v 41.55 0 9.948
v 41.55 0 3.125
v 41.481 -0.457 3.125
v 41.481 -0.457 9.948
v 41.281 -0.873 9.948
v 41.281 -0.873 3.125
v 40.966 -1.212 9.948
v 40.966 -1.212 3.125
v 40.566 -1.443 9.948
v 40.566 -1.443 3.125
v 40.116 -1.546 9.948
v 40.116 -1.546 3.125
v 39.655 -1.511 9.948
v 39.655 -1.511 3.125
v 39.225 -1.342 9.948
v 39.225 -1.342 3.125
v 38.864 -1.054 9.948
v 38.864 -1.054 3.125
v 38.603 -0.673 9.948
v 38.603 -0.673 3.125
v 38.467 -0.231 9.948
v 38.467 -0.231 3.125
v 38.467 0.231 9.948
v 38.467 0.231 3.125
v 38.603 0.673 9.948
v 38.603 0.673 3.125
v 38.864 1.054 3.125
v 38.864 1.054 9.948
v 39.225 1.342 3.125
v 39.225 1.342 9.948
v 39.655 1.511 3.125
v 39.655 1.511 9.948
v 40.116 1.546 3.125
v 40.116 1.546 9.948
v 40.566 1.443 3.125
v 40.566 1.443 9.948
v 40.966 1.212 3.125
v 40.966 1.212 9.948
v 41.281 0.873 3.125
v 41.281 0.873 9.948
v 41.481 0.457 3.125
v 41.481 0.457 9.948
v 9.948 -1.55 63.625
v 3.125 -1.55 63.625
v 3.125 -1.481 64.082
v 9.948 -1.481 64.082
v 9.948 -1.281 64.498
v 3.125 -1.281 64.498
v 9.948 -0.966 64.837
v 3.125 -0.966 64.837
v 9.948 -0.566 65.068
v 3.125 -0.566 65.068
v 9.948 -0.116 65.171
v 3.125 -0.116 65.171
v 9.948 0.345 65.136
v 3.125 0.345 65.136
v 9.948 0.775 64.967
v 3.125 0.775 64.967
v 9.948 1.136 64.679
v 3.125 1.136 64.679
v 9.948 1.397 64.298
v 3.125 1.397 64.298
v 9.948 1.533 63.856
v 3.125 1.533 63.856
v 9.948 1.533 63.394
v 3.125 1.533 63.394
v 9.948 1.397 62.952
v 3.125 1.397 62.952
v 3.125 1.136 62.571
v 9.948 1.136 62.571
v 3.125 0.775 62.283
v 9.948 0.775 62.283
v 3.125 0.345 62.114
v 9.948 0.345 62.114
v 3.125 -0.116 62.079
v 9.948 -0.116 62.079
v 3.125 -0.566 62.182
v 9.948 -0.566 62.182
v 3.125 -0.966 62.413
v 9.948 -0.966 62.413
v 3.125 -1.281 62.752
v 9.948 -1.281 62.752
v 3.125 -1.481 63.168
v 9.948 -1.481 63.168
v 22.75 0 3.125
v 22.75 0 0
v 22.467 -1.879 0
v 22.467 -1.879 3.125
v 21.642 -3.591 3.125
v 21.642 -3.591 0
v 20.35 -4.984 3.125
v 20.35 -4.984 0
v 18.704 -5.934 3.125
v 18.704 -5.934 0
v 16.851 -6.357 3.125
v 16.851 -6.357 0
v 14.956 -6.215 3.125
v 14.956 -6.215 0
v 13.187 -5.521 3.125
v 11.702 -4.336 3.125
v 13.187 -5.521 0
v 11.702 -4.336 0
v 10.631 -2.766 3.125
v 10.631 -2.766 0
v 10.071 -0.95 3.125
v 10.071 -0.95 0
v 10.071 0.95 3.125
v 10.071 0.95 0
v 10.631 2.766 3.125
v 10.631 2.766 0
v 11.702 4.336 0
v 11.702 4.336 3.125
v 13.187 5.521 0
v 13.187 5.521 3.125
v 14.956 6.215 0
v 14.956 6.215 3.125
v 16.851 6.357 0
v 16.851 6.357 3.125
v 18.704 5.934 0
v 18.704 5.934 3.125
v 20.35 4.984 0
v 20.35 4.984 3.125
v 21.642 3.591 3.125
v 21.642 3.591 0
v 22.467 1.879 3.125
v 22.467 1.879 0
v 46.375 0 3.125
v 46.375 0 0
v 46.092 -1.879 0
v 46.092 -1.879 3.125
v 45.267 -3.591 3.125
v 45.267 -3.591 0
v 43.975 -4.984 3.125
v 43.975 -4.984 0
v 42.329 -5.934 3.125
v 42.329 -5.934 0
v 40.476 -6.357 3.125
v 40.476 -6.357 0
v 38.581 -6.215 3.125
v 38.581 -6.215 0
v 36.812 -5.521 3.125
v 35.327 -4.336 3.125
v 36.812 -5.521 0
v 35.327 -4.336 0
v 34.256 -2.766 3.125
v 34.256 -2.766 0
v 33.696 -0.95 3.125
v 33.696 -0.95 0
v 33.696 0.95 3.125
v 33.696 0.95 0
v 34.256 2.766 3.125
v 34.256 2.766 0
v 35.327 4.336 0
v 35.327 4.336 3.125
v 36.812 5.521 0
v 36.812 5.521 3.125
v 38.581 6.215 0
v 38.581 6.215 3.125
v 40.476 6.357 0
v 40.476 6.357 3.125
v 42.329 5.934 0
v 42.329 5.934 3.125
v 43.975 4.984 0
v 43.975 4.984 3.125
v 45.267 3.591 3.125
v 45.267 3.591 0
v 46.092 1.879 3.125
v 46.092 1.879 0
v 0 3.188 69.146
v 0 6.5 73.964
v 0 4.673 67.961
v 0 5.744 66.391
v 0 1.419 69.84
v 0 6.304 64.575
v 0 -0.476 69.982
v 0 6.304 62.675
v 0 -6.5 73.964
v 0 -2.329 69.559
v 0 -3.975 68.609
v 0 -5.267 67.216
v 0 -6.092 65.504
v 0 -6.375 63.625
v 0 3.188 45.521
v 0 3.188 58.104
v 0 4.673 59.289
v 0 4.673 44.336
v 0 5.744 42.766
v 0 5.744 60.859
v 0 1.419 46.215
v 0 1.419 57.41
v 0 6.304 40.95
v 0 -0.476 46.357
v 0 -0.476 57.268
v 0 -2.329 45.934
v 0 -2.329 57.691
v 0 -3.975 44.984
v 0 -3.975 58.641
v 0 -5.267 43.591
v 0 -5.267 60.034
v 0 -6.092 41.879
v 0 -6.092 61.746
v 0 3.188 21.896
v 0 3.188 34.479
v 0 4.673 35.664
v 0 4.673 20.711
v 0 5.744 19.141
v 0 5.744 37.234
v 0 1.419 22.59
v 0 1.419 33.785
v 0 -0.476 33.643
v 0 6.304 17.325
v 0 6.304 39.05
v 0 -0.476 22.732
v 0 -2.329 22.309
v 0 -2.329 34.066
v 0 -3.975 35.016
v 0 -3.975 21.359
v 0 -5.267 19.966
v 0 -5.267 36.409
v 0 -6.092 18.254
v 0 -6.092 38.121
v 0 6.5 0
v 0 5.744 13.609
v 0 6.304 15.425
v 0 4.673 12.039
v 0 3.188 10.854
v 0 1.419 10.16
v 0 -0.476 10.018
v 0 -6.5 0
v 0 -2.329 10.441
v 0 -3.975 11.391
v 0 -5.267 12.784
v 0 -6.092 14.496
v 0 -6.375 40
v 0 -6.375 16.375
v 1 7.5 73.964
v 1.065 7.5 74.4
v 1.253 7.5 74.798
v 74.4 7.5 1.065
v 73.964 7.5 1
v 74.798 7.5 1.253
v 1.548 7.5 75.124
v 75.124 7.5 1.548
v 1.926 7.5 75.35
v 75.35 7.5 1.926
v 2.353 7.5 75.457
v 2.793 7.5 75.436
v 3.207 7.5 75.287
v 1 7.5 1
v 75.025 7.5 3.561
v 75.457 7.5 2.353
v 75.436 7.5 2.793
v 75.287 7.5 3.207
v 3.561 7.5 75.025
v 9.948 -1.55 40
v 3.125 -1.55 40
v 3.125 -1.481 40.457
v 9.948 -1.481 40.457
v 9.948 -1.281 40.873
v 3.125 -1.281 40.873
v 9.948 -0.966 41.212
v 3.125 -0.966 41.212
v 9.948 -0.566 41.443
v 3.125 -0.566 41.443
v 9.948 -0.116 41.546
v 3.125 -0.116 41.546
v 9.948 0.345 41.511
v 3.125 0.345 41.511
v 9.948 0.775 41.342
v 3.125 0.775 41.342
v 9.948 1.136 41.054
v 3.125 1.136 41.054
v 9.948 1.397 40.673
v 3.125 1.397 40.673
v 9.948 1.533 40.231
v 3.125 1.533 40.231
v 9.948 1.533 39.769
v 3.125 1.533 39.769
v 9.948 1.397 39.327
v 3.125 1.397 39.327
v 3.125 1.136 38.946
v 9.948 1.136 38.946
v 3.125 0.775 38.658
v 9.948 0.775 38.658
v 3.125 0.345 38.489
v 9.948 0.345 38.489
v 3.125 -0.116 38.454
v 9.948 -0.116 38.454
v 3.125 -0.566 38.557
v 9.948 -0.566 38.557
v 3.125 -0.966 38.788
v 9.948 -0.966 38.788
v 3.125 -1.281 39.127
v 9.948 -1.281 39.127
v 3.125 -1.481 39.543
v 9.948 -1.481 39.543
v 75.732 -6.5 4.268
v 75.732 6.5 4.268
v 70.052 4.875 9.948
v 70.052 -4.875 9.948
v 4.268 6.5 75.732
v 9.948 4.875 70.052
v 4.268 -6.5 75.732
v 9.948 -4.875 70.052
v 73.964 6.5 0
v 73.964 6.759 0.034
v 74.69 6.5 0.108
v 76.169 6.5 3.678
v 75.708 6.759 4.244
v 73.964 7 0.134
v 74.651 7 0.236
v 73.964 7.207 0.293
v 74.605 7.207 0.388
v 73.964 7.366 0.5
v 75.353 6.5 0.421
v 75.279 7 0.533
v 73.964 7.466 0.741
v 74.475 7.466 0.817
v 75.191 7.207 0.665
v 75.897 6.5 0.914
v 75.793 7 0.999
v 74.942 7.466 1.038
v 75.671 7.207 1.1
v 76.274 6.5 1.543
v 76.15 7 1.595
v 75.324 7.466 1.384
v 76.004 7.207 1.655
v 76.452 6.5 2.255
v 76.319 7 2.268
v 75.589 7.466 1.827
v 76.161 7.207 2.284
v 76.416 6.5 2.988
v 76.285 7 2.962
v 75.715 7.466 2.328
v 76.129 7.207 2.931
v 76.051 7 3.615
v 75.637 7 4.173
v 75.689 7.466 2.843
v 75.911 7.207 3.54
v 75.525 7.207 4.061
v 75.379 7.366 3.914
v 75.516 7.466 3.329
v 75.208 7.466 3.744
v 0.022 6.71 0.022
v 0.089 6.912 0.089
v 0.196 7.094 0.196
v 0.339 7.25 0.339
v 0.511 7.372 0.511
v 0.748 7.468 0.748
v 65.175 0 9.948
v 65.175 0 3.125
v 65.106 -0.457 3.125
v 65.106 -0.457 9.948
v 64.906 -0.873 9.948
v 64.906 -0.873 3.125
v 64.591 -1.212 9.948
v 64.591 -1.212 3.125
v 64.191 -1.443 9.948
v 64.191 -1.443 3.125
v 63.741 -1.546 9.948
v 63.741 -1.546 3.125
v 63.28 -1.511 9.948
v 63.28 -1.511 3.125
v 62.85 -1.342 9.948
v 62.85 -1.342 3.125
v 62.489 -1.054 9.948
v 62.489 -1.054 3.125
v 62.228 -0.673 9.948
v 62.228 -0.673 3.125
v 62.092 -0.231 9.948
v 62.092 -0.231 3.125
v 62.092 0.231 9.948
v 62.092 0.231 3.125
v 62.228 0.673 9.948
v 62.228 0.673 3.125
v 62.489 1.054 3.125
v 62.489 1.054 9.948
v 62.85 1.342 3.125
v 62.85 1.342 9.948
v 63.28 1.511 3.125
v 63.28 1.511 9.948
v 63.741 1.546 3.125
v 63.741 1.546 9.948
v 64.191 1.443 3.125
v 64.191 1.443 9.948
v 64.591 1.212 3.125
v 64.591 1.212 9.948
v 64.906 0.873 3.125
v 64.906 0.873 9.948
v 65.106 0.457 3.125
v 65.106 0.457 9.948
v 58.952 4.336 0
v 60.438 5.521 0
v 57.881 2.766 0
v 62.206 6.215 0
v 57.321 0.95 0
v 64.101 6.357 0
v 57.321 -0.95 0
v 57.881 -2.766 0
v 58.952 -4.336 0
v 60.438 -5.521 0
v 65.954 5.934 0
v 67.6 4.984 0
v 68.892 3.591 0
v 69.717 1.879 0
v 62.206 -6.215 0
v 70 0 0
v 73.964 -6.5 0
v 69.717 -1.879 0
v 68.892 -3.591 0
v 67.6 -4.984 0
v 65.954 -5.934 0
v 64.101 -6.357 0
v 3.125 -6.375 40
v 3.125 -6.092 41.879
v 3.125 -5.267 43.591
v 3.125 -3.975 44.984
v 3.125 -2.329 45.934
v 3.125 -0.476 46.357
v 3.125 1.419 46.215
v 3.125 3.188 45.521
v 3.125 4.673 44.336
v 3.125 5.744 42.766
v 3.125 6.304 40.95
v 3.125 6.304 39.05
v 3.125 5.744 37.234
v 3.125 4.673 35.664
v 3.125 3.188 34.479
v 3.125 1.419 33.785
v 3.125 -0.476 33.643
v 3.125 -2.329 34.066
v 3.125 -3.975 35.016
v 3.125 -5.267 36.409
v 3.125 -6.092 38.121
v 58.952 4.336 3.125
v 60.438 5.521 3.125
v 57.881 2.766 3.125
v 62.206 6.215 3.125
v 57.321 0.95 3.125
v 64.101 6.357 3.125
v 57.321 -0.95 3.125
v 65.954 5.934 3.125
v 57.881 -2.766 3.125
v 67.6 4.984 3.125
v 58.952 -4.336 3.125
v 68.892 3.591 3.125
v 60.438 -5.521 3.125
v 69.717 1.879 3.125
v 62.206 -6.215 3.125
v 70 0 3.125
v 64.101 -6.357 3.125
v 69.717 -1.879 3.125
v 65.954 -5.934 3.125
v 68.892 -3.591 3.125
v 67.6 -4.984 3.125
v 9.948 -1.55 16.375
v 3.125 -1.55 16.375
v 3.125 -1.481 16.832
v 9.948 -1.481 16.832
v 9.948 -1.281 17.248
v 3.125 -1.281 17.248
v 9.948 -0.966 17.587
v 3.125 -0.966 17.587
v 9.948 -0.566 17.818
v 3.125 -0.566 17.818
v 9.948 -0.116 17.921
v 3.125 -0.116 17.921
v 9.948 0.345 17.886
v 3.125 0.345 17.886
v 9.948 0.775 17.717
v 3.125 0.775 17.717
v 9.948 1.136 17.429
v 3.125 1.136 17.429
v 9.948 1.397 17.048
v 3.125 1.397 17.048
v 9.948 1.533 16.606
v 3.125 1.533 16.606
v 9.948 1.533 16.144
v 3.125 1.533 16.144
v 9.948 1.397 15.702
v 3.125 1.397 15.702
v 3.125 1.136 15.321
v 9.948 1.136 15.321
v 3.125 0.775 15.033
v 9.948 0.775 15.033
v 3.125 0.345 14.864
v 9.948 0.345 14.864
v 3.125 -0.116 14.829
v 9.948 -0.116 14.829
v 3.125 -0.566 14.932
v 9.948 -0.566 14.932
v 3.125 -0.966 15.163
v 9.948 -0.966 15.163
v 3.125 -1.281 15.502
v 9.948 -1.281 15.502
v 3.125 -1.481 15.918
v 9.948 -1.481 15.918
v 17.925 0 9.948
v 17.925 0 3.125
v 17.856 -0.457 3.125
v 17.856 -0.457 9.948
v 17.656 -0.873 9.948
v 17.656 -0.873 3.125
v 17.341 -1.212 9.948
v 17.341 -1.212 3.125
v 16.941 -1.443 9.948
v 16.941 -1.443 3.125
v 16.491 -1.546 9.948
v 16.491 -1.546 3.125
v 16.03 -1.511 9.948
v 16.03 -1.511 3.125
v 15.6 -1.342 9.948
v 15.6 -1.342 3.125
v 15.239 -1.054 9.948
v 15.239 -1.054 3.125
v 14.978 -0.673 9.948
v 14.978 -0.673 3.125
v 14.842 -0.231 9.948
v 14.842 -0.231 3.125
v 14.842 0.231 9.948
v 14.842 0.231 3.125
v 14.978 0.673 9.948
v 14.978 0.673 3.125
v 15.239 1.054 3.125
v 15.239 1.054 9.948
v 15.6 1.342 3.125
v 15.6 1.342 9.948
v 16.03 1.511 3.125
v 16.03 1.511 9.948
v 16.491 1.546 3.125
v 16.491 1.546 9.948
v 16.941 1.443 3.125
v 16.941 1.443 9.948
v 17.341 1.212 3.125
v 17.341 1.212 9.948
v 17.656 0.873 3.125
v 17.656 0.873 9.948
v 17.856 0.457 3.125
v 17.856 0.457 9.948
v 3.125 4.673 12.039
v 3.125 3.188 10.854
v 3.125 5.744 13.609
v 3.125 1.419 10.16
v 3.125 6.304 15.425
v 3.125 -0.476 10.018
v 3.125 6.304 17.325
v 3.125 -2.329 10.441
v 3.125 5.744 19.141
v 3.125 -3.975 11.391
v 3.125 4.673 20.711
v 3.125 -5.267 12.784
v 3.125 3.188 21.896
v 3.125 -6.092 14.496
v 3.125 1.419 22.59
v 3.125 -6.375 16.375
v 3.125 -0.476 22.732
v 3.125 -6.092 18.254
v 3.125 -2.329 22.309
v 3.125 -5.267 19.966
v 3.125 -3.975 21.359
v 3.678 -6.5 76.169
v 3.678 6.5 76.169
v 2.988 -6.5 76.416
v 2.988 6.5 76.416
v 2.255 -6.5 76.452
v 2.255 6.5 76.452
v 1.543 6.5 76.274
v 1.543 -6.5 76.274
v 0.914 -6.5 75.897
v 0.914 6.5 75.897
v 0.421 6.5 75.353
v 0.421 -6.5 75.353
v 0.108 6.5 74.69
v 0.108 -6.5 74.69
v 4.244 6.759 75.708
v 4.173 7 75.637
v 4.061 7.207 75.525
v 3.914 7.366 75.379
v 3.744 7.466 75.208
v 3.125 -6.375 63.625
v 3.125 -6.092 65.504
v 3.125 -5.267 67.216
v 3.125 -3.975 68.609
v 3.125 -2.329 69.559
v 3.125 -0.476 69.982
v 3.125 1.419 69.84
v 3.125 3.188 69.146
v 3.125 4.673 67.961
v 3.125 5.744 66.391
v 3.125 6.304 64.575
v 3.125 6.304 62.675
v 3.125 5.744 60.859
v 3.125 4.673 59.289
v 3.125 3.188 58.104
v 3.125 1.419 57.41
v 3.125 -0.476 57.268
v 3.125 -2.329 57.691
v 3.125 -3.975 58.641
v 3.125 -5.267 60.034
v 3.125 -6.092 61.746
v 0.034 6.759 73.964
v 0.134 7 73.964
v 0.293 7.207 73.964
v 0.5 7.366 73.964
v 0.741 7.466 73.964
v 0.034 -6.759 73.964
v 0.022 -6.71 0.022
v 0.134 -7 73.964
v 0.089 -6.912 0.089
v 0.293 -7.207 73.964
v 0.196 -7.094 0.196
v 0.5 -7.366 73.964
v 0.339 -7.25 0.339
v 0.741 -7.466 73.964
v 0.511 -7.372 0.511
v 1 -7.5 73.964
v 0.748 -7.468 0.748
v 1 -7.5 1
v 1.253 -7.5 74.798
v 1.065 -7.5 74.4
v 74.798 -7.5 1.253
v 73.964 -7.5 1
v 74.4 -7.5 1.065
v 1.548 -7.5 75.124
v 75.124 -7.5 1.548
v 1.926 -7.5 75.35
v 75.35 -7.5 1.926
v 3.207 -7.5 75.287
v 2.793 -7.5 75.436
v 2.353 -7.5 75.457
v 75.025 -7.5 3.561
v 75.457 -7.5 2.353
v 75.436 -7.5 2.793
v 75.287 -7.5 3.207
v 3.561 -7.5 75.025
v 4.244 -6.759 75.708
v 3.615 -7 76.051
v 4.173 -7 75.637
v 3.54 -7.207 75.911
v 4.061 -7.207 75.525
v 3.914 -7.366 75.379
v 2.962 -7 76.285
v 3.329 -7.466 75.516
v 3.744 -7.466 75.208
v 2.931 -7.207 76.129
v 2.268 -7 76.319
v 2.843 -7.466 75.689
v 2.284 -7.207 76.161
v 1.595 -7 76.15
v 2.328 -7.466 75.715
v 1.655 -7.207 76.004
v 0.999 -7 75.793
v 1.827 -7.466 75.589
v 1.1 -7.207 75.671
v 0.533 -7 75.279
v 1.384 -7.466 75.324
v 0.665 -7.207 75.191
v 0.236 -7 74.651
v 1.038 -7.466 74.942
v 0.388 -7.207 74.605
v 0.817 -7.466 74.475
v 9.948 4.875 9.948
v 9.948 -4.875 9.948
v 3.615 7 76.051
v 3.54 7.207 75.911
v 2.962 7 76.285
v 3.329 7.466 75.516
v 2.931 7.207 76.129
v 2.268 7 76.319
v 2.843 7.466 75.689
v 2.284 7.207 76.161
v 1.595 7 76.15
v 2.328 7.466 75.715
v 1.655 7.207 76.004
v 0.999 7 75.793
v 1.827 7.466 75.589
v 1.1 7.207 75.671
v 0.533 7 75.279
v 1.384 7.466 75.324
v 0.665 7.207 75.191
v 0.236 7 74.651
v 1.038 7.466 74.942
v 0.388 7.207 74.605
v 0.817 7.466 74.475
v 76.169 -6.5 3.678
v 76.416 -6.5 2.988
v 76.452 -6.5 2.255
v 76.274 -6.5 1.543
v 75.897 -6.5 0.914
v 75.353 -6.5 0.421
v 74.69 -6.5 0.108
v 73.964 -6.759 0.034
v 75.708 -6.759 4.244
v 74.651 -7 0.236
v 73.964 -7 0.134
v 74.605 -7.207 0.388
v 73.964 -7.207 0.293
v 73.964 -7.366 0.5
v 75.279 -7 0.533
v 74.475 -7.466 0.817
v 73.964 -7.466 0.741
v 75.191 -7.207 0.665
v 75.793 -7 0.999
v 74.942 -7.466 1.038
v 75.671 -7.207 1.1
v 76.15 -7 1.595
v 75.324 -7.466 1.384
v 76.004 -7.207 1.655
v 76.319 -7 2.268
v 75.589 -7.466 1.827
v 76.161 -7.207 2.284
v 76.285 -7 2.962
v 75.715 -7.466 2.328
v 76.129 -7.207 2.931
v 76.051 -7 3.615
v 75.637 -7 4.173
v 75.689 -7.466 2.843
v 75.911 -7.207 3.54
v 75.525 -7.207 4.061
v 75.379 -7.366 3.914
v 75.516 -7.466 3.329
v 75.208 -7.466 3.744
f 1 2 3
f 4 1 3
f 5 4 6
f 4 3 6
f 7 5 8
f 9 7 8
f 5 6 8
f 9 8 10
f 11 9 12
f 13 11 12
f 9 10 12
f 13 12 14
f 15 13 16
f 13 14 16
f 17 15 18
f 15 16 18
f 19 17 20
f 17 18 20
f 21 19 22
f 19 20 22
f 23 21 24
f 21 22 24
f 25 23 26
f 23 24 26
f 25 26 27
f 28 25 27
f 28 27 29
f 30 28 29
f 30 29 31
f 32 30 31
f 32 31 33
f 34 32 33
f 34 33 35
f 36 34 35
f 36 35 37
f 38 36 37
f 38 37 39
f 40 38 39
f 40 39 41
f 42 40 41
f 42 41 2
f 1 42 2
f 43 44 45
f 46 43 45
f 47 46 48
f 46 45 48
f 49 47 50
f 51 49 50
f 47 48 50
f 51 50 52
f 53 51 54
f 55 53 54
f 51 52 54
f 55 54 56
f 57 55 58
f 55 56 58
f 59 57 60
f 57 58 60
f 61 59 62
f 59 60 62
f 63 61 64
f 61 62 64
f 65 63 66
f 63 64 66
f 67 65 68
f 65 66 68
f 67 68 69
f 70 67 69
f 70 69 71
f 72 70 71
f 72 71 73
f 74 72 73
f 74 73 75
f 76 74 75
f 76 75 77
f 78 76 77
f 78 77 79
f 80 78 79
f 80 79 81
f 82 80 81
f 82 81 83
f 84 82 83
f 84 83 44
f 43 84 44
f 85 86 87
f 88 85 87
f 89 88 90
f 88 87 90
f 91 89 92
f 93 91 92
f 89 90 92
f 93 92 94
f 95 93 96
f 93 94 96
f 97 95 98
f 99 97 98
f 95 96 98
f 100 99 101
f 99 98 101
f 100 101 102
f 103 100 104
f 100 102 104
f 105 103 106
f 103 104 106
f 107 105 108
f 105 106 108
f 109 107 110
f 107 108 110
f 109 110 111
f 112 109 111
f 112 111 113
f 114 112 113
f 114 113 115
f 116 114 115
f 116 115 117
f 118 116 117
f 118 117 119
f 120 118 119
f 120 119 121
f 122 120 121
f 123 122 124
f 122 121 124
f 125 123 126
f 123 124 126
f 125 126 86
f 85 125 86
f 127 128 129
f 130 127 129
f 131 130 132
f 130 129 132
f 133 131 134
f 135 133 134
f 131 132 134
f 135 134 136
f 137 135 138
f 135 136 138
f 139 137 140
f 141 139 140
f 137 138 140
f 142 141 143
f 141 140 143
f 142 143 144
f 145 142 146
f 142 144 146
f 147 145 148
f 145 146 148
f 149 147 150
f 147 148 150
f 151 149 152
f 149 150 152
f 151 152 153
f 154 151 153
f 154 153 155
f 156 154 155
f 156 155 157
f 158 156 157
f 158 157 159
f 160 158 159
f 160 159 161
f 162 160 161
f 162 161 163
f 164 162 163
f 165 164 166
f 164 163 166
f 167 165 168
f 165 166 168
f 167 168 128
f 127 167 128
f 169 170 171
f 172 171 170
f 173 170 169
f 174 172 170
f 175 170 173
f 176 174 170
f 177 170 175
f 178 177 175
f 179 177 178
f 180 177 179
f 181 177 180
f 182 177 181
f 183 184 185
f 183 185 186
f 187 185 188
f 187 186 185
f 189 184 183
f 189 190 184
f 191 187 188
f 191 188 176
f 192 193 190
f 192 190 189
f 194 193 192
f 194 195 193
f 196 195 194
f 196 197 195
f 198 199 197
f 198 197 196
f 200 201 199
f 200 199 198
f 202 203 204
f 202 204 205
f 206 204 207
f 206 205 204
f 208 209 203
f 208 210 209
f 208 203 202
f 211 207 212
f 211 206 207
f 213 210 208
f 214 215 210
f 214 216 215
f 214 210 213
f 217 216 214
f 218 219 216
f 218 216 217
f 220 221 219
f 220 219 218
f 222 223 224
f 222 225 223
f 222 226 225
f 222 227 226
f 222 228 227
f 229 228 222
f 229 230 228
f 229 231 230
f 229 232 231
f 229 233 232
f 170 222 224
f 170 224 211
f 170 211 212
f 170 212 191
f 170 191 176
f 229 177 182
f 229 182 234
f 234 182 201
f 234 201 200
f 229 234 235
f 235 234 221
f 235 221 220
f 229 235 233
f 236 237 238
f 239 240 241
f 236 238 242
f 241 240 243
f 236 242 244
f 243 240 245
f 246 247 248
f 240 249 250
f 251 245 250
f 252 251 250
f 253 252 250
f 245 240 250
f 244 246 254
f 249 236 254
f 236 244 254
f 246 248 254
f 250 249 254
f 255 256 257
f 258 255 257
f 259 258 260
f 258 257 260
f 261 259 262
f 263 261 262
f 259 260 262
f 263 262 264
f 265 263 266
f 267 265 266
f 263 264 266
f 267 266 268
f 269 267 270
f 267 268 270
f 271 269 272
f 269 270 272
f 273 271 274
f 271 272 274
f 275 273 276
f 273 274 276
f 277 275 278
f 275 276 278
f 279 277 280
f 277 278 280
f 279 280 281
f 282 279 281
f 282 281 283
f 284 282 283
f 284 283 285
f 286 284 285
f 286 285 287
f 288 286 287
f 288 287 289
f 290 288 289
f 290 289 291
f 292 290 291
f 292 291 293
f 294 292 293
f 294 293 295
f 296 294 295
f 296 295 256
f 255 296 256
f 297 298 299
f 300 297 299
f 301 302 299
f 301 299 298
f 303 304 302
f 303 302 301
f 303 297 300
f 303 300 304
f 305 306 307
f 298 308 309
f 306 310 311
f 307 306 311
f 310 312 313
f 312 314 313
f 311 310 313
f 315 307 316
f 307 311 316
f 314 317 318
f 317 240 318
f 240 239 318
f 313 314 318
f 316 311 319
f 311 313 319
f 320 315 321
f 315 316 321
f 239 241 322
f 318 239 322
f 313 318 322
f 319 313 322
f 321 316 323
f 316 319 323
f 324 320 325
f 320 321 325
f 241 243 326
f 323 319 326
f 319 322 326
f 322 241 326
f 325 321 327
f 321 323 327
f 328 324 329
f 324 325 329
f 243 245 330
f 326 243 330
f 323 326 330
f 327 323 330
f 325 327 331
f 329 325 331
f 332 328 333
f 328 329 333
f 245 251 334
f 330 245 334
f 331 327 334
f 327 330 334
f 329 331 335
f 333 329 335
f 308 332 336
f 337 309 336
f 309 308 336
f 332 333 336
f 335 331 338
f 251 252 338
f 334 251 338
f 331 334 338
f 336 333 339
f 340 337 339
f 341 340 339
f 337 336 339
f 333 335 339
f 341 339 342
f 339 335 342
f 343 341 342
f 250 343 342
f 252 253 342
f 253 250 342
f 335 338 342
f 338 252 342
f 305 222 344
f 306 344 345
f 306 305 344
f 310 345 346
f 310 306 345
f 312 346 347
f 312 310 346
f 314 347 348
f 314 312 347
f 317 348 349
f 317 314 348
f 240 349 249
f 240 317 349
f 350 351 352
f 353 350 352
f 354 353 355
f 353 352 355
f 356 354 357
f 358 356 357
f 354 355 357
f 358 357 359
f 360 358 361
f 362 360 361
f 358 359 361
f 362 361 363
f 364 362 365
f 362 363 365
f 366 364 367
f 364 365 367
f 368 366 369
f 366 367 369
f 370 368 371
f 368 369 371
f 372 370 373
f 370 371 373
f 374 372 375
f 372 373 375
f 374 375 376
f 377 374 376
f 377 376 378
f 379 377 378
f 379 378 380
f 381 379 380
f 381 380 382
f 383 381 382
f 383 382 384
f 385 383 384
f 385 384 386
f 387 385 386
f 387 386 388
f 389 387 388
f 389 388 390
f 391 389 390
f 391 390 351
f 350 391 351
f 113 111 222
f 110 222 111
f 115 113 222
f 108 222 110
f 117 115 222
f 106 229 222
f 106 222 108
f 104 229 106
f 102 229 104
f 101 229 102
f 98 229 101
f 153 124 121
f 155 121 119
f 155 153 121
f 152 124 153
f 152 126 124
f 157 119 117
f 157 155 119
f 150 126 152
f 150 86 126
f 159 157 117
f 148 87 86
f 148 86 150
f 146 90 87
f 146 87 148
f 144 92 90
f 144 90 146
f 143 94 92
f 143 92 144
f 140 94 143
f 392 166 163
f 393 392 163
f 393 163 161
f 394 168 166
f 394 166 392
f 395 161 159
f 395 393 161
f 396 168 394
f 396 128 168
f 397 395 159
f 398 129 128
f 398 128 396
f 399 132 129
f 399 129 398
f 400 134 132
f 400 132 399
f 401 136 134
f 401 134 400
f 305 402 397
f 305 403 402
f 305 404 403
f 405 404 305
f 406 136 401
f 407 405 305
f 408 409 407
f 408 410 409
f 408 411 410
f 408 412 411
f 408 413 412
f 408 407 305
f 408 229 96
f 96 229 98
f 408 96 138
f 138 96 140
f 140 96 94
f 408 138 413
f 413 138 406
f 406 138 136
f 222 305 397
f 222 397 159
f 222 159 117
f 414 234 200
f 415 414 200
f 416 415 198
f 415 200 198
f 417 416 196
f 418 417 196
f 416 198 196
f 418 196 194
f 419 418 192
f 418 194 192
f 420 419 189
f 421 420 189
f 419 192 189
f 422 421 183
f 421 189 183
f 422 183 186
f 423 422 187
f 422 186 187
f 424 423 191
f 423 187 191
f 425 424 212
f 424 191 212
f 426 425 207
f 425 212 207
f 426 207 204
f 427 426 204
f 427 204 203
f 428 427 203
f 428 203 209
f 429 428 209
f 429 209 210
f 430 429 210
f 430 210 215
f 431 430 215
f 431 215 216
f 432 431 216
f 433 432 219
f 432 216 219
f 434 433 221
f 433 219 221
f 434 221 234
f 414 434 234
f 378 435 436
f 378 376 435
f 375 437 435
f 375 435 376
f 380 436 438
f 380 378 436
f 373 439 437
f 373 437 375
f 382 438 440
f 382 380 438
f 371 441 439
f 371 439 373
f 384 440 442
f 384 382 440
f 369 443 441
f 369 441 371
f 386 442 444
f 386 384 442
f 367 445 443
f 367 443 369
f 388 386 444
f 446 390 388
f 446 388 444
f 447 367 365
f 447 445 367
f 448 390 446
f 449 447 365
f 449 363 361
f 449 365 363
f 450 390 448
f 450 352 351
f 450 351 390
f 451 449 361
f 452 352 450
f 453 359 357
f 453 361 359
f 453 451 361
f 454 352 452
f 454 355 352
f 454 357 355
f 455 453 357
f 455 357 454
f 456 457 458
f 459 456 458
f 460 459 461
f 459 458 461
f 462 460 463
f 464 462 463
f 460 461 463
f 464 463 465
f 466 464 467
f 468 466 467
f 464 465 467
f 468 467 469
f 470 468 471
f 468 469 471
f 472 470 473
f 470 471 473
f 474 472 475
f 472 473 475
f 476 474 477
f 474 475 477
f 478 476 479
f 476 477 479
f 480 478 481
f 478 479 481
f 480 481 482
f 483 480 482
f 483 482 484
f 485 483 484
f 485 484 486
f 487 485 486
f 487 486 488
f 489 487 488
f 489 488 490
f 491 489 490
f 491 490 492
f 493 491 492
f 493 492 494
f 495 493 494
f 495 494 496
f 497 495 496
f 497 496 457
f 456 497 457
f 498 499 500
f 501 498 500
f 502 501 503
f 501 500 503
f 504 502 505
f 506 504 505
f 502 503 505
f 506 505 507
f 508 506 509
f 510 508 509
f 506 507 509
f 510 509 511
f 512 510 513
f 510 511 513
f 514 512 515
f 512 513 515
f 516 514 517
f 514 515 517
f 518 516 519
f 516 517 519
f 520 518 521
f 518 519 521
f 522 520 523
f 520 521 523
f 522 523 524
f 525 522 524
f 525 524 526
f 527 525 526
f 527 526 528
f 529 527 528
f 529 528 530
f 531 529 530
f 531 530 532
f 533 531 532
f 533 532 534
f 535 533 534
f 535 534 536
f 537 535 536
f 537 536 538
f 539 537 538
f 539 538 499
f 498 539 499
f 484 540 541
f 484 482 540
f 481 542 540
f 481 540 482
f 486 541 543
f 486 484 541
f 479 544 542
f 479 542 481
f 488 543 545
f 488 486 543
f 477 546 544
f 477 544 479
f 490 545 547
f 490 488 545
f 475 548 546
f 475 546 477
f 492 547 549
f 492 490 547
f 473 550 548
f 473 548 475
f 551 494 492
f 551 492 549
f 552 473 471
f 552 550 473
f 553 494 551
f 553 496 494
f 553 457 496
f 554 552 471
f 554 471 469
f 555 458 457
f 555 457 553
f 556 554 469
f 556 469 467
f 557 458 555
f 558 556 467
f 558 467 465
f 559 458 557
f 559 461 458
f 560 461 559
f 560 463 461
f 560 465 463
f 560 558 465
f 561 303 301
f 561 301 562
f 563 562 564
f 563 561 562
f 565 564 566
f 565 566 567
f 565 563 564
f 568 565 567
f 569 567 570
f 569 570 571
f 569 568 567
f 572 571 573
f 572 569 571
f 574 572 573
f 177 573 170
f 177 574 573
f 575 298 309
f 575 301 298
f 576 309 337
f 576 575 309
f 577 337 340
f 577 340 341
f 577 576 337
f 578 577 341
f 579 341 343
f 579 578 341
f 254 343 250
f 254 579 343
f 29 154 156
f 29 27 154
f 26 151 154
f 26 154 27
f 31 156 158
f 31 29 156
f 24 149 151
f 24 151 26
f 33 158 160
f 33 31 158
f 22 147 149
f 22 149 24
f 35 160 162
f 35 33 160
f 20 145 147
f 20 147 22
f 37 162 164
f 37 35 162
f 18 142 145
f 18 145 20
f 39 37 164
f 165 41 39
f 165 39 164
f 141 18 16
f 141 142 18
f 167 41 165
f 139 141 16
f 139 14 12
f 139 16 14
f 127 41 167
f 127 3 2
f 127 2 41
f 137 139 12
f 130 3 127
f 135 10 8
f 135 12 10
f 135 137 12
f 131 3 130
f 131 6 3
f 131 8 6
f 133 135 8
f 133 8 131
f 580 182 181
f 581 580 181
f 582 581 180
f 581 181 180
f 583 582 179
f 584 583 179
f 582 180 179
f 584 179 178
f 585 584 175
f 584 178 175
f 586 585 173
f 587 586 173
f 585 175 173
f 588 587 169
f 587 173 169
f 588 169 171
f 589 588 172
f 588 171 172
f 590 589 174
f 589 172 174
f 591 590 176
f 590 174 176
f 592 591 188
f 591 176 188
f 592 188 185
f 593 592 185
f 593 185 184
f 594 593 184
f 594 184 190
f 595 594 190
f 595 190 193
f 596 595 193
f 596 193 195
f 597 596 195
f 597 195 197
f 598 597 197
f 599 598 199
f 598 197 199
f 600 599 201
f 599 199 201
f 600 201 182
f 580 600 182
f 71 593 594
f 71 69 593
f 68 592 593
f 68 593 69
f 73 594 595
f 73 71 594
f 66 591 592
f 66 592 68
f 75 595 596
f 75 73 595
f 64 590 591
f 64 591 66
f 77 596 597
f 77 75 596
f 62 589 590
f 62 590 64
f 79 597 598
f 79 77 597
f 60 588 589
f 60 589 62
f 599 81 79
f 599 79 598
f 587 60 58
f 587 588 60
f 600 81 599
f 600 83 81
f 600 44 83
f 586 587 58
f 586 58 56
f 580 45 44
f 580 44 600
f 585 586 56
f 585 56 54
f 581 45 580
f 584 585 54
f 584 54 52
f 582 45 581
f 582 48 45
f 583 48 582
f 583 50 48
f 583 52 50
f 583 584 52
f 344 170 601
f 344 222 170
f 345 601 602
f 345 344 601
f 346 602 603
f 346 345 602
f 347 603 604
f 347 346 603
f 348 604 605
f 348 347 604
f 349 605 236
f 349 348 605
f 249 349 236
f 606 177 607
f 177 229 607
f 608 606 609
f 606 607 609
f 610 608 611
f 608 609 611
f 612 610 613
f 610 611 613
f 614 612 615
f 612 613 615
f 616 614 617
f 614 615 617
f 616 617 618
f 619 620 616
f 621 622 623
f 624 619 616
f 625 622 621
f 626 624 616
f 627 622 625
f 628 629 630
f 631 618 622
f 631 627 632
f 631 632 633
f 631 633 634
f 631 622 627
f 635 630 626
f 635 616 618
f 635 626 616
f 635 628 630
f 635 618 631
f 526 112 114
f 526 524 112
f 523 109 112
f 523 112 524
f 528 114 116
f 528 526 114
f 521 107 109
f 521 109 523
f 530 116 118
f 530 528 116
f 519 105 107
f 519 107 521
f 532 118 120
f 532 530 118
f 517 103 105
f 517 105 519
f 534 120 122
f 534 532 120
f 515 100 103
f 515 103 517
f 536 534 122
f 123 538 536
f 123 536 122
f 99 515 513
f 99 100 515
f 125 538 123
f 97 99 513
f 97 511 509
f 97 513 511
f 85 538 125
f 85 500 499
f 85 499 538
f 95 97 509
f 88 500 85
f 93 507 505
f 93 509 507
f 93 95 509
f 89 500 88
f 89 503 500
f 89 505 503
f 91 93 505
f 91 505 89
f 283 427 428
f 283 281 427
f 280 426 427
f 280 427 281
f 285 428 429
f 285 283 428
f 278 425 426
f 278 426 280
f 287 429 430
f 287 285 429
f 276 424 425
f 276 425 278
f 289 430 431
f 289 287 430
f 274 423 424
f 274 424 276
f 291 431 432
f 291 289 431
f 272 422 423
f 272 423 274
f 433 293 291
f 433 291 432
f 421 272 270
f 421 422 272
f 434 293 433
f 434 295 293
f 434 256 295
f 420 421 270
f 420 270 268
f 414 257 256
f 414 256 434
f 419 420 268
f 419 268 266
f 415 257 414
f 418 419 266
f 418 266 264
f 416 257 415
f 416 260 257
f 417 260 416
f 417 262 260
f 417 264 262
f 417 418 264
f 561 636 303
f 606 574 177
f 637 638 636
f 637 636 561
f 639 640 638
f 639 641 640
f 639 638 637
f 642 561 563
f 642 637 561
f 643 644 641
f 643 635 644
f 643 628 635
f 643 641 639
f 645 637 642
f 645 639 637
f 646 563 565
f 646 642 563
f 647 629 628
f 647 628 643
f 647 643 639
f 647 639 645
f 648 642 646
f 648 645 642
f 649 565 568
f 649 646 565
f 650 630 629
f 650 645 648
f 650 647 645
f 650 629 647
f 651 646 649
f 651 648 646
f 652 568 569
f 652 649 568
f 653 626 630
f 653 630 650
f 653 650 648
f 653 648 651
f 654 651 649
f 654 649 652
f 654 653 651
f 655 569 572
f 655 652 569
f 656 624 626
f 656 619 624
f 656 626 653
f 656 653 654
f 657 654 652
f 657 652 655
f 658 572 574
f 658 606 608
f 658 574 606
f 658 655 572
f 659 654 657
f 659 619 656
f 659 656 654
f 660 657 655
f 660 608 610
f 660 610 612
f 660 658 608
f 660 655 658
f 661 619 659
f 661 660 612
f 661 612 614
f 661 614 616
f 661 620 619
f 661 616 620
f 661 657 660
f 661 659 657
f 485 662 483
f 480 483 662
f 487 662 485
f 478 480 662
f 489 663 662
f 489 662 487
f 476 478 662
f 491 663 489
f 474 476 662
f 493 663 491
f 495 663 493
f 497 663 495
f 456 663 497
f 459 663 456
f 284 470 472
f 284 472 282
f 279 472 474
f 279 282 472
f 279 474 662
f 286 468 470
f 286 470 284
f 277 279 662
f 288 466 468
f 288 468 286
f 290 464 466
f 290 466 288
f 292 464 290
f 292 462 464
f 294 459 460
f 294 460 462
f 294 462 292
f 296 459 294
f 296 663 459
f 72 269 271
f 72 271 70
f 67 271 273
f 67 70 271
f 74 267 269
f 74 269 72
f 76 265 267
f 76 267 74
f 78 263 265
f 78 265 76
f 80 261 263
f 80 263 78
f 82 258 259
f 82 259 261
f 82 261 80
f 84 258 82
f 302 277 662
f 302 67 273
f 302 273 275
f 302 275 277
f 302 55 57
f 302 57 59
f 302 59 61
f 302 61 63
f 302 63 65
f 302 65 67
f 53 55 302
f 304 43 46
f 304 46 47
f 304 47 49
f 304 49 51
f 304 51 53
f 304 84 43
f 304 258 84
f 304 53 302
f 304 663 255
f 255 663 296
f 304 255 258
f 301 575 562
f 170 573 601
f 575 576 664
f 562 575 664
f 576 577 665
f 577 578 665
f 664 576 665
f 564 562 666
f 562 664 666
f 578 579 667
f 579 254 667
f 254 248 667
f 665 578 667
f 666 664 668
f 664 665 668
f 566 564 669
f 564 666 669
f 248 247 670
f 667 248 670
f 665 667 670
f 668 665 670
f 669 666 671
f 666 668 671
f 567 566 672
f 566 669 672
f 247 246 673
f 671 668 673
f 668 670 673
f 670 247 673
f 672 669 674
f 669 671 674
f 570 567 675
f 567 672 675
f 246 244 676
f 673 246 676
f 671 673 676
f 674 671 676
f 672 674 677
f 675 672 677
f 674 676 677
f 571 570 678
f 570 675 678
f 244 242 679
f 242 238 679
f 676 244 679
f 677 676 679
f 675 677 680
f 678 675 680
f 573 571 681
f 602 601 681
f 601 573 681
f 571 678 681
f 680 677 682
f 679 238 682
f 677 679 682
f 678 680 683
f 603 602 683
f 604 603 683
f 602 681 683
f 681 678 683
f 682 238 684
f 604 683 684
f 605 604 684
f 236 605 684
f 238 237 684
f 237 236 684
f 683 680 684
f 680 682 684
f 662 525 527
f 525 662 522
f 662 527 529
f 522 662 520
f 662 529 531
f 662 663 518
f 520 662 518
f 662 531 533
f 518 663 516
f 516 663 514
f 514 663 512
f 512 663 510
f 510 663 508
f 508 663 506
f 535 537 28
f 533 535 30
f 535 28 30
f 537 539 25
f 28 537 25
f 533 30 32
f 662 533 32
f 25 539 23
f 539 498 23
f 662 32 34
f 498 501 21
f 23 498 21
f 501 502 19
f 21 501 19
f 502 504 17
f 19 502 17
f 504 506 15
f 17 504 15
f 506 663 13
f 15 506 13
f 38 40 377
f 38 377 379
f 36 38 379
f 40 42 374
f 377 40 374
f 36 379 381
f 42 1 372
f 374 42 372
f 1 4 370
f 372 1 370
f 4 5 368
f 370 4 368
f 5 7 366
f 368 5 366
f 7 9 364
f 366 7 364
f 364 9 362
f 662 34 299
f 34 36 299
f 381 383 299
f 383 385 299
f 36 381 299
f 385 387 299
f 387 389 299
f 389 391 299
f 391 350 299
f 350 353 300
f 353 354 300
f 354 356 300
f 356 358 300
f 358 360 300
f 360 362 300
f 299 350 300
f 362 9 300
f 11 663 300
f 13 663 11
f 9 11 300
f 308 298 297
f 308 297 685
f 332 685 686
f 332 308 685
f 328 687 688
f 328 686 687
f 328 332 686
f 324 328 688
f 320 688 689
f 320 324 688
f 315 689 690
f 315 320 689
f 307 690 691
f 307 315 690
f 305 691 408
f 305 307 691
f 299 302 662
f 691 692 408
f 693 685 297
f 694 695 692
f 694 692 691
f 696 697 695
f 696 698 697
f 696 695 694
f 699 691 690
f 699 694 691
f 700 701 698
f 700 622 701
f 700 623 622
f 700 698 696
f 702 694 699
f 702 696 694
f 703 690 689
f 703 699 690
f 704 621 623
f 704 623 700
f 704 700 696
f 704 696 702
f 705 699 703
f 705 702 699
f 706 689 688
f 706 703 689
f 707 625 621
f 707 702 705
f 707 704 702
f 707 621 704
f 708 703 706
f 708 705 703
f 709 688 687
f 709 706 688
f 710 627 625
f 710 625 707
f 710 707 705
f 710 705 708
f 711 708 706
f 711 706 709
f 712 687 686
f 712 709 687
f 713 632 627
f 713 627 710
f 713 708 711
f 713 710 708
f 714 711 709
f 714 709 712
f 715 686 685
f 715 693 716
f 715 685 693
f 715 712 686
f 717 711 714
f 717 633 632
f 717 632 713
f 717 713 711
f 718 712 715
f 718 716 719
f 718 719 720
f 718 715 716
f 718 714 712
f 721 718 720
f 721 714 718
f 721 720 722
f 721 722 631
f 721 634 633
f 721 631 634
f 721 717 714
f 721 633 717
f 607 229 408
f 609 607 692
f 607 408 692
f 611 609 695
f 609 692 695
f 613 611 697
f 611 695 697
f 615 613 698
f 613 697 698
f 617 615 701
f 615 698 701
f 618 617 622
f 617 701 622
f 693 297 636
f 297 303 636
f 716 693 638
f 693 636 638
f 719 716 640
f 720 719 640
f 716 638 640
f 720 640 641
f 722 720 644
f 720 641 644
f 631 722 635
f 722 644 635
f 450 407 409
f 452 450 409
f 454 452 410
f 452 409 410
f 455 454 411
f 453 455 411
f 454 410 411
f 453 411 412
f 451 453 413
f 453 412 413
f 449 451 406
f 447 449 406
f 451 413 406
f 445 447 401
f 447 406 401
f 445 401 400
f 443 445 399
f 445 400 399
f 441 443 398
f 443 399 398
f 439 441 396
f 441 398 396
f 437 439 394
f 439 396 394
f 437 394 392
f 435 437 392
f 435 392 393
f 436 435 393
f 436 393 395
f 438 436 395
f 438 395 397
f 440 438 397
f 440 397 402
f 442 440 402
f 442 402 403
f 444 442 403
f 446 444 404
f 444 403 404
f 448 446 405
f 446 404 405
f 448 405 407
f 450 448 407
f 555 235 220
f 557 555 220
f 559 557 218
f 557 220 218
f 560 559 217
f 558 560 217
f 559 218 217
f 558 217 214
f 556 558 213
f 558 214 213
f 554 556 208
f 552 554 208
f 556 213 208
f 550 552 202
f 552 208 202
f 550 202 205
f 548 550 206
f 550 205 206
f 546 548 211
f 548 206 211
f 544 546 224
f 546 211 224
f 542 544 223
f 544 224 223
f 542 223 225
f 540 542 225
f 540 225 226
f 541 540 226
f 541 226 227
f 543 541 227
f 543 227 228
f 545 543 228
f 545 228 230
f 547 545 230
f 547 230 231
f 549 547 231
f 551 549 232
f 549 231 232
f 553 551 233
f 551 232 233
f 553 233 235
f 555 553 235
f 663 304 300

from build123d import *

# Parameters (mm, degrees)
F1_DEPTH  = 7.5
F2_R      = 6.375
F3_DEPTH  = 3.125
F4_R      = 6.375
F5_DEPTH  = 3.125
F6_W      = 60.104076
F6_H      = 60.104076
F7_DEPTH  = 4.875
F8_R      = 1.55
F9_DEPTH  = 76.876
F10_R     = 1.55
F11_DEPTH = 76.876
F12_R     = 2.5
F13_R     = 1


with BuildPart() as f1:
    # F0 (on Front) → F1 (new body, symmetric)
    with BuildSketch(Plane.XZ):
        Polygon((80, 0), (0, 80), (0, 0), align=None)
    extrude(amount=F1_DEPTH, both=True)

    # F2 (on face) → F3 (cut)
    with BuildSketch(Plane(origin=(0, 0, 0), x_dir=(0, -1, 0), z_dir=(-1, 0, 0))):
        with Locations((0, 63.625)):
            Circle(F2_R)
        with Locations((0, 40)):
            Circle(F2_R)
        with Locations((0, 16.375)):
            Circle(F2_R)
    extrude(amount=-F3_DEPTH, mode=Mode.SUBTRACT)

    # F4 (on face) → F5 (cut)
    with BuildSketch(Plane(origin=(0, 0, 0), x_dir=(1, 0, 0), z_dir=(0, 0, -1))):
        with Locations((16.375, 0)):
            Circle(F4_R)
        with Locations((40, 0)):
            Circle(F4_R)
        with Locations((63.625, 0)):
            Circle(F4_R)
    extrude(amount=-F5_DEPTH, mode=Mode.SUBTRACT)

    # F6 (on Front) → F7 (cut, symmetric)
    with BuildSketch(Plane.XZ):
        with Locations((40, 40)):
            Rectangle(F6_W, F6_H)
    extrude(amount=F7_DEPTH, both=True, mode=Mode.SUBTRACT)

    # F8 (on face) → F9 (cut, through all)
    with BuildSketch(Plane(origin=(3.125, 0, 0), x_dir=(0, -1, 0), z_dir=(-1, 0, 0))):
        with Locations((0, 63.625)):
            Circle(F8_R)
        with Locations((0, 40)):
            Circle(F8_R)
        with Locations((0, 16.375)):
            Circle(F8_R)
    extrude(amount=-F9_DEPTH, mode=Mode.SUBTRACT)

    # F10 (on face) → F11 (cut, through all)
    with BuildSketch(Plane(origin=(0, 0, 3.125), x_dir=(1, 0, 0), z_dir=(0, 0, -1))):
        with Locations((16.375, 0)):
            Circle(F10_R)
        with Locations((40, 0)):
            Circle(F10_R)
        with Locations((63.625, 0)):
            Circle(F10_R)
    extrude(amount=-F11_DEPTH, mode=Mode.SUBTRACT)

    # F12
    f12_edges = [f1.edges().sort_by_distance(p)[0] for p in [
        (0, 0, 80),
        (80, 0, 0),
    ]]
    fillet(f12_edges, radius=F12_R)

    # F13
    f13_edges = [f1.edges().sort_by_distance(p)[0] for p in [
        (40, -7.5, 40),
        (40, 7.5, 40),
    ]]
    fillet(f13_edges, radius=F13_R)


solid = f1.part
